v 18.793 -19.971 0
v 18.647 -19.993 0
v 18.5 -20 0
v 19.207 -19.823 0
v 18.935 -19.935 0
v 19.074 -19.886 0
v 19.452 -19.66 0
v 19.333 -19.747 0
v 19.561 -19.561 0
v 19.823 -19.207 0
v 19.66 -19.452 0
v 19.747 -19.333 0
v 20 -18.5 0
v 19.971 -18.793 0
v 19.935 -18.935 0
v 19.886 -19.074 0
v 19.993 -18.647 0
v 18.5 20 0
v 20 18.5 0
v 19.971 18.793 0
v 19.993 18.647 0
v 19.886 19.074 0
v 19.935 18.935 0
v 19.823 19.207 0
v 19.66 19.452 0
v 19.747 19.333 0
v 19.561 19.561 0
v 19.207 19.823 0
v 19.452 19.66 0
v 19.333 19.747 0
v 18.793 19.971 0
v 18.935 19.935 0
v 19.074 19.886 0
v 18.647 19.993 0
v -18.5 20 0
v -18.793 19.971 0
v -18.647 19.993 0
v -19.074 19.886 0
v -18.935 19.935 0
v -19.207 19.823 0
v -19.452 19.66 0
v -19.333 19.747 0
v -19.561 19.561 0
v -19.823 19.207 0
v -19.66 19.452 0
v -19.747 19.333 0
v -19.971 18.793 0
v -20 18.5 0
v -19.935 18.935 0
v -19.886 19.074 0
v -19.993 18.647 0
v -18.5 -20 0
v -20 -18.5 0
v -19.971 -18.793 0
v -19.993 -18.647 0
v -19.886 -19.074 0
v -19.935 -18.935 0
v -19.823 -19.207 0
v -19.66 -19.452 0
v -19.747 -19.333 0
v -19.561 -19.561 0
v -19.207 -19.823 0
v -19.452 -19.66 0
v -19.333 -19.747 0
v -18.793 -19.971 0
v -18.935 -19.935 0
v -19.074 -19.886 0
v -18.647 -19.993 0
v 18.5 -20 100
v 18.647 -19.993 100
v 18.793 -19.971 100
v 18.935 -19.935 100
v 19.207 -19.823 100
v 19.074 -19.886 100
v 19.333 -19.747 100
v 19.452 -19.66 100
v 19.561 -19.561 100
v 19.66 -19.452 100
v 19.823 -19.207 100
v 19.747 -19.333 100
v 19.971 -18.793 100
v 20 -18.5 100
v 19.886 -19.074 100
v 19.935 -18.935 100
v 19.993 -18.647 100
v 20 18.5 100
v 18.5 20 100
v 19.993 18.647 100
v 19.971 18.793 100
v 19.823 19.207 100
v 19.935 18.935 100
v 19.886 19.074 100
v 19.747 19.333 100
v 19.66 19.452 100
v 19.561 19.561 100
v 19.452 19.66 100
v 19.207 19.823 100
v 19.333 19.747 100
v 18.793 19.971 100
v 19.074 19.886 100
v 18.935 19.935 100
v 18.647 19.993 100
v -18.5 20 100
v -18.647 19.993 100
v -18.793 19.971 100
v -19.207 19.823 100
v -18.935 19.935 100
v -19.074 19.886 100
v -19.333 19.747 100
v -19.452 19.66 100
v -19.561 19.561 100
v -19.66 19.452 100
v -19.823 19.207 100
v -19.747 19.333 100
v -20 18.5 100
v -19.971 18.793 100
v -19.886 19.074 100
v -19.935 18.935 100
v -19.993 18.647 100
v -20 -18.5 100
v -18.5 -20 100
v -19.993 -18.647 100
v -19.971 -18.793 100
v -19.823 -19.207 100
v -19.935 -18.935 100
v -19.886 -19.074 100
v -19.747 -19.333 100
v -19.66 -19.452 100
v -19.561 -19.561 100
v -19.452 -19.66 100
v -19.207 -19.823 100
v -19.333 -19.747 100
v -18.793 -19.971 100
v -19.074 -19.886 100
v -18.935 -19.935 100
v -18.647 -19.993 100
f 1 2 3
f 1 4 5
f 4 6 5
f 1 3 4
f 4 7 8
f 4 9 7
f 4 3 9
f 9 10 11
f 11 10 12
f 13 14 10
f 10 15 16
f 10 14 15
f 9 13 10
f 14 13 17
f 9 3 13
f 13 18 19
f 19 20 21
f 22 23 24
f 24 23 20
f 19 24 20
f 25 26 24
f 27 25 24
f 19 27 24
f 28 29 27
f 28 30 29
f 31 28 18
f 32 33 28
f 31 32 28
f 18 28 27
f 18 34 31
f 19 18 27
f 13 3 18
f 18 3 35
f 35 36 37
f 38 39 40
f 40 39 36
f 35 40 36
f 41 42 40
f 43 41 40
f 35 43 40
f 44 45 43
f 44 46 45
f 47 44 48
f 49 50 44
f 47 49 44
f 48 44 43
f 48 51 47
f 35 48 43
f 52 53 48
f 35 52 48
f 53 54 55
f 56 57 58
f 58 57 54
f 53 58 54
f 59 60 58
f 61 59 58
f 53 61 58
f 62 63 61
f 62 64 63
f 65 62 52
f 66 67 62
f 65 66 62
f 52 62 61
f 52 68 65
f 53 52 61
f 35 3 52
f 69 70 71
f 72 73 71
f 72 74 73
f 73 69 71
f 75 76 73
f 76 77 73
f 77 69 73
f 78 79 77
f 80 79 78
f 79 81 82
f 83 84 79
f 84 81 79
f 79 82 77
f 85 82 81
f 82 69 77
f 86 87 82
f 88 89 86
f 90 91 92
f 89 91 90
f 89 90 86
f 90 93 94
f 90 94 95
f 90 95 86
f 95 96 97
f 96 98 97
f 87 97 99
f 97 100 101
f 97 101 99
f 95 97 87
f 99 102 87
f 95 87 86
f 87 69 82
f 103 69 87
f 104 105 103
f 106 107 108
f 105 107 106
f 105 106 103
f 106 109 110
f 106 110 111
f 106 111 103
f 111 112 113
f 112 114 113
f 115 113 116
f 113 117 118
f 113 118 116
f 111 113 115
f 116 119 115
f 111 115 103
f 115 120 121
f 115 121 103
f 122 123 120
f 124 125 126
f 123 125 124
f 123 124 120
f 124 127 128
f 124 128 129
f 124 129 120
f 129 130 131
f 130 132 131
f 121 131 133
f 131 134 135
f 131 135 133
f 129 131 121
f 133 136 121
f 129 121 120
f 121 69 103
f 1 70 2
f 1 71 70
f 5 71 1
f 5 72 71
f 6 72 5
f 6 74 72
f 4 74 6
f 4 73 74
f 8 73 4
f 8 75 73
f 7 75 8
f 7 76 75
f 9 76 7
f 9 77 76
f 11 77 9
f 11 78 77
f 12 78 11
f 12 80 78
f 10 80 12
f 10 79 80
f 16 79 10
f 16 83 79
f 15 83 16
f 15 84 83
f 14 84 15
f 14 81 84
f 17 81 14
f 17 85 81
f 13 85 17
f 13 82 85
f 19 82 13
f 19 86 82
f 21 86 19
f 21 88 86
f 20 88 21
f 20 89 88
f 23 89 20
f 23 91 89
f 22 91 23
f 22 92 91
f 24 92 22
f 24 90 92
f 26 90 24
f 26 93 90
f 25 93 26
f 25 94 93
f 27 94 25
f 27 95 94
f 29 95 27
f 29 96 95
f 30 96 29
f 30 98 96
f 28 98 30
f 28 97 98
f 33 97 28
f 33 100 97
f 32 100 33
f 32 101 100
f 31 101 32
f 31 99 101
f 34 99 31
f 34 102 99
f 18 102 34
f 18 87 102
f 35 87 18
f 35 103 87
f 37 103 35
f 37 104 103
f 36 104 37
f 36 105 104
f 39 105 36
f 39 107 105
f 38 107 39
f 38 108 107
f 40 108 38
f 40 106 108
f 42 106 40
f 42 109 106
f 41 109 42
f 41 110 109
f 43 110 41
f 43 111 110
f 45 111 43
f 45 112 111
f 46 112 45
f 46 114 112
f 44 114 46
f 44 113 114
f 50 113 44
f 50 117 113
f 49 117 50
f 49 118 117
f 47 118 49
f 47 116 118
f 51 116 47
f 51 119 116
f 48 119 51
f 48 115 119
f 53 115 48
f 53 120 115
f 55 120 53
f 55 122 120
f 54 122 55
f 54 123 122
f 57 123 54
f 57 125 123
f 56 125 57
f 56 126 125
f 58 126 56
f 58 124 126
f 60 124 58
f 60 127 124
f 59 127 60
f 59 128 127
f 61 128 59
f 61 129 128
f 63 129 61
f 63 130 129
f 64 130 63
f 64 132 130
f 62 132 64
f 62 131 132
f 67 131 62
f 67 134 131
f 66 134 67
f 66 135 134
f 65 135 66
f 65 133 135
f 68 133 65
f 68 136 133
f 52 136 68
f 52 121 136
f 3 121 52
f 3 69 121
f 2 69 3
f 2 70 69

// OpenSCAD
$fn = 64;

length = 100;
size = 40;
corner_r = 1.5;

color([0.75, 0.78, 0.82])
linear_extrude(height = length)
offset(r = corner_r)
offset(delta = -corner_r)
square([size, size], center = true);
